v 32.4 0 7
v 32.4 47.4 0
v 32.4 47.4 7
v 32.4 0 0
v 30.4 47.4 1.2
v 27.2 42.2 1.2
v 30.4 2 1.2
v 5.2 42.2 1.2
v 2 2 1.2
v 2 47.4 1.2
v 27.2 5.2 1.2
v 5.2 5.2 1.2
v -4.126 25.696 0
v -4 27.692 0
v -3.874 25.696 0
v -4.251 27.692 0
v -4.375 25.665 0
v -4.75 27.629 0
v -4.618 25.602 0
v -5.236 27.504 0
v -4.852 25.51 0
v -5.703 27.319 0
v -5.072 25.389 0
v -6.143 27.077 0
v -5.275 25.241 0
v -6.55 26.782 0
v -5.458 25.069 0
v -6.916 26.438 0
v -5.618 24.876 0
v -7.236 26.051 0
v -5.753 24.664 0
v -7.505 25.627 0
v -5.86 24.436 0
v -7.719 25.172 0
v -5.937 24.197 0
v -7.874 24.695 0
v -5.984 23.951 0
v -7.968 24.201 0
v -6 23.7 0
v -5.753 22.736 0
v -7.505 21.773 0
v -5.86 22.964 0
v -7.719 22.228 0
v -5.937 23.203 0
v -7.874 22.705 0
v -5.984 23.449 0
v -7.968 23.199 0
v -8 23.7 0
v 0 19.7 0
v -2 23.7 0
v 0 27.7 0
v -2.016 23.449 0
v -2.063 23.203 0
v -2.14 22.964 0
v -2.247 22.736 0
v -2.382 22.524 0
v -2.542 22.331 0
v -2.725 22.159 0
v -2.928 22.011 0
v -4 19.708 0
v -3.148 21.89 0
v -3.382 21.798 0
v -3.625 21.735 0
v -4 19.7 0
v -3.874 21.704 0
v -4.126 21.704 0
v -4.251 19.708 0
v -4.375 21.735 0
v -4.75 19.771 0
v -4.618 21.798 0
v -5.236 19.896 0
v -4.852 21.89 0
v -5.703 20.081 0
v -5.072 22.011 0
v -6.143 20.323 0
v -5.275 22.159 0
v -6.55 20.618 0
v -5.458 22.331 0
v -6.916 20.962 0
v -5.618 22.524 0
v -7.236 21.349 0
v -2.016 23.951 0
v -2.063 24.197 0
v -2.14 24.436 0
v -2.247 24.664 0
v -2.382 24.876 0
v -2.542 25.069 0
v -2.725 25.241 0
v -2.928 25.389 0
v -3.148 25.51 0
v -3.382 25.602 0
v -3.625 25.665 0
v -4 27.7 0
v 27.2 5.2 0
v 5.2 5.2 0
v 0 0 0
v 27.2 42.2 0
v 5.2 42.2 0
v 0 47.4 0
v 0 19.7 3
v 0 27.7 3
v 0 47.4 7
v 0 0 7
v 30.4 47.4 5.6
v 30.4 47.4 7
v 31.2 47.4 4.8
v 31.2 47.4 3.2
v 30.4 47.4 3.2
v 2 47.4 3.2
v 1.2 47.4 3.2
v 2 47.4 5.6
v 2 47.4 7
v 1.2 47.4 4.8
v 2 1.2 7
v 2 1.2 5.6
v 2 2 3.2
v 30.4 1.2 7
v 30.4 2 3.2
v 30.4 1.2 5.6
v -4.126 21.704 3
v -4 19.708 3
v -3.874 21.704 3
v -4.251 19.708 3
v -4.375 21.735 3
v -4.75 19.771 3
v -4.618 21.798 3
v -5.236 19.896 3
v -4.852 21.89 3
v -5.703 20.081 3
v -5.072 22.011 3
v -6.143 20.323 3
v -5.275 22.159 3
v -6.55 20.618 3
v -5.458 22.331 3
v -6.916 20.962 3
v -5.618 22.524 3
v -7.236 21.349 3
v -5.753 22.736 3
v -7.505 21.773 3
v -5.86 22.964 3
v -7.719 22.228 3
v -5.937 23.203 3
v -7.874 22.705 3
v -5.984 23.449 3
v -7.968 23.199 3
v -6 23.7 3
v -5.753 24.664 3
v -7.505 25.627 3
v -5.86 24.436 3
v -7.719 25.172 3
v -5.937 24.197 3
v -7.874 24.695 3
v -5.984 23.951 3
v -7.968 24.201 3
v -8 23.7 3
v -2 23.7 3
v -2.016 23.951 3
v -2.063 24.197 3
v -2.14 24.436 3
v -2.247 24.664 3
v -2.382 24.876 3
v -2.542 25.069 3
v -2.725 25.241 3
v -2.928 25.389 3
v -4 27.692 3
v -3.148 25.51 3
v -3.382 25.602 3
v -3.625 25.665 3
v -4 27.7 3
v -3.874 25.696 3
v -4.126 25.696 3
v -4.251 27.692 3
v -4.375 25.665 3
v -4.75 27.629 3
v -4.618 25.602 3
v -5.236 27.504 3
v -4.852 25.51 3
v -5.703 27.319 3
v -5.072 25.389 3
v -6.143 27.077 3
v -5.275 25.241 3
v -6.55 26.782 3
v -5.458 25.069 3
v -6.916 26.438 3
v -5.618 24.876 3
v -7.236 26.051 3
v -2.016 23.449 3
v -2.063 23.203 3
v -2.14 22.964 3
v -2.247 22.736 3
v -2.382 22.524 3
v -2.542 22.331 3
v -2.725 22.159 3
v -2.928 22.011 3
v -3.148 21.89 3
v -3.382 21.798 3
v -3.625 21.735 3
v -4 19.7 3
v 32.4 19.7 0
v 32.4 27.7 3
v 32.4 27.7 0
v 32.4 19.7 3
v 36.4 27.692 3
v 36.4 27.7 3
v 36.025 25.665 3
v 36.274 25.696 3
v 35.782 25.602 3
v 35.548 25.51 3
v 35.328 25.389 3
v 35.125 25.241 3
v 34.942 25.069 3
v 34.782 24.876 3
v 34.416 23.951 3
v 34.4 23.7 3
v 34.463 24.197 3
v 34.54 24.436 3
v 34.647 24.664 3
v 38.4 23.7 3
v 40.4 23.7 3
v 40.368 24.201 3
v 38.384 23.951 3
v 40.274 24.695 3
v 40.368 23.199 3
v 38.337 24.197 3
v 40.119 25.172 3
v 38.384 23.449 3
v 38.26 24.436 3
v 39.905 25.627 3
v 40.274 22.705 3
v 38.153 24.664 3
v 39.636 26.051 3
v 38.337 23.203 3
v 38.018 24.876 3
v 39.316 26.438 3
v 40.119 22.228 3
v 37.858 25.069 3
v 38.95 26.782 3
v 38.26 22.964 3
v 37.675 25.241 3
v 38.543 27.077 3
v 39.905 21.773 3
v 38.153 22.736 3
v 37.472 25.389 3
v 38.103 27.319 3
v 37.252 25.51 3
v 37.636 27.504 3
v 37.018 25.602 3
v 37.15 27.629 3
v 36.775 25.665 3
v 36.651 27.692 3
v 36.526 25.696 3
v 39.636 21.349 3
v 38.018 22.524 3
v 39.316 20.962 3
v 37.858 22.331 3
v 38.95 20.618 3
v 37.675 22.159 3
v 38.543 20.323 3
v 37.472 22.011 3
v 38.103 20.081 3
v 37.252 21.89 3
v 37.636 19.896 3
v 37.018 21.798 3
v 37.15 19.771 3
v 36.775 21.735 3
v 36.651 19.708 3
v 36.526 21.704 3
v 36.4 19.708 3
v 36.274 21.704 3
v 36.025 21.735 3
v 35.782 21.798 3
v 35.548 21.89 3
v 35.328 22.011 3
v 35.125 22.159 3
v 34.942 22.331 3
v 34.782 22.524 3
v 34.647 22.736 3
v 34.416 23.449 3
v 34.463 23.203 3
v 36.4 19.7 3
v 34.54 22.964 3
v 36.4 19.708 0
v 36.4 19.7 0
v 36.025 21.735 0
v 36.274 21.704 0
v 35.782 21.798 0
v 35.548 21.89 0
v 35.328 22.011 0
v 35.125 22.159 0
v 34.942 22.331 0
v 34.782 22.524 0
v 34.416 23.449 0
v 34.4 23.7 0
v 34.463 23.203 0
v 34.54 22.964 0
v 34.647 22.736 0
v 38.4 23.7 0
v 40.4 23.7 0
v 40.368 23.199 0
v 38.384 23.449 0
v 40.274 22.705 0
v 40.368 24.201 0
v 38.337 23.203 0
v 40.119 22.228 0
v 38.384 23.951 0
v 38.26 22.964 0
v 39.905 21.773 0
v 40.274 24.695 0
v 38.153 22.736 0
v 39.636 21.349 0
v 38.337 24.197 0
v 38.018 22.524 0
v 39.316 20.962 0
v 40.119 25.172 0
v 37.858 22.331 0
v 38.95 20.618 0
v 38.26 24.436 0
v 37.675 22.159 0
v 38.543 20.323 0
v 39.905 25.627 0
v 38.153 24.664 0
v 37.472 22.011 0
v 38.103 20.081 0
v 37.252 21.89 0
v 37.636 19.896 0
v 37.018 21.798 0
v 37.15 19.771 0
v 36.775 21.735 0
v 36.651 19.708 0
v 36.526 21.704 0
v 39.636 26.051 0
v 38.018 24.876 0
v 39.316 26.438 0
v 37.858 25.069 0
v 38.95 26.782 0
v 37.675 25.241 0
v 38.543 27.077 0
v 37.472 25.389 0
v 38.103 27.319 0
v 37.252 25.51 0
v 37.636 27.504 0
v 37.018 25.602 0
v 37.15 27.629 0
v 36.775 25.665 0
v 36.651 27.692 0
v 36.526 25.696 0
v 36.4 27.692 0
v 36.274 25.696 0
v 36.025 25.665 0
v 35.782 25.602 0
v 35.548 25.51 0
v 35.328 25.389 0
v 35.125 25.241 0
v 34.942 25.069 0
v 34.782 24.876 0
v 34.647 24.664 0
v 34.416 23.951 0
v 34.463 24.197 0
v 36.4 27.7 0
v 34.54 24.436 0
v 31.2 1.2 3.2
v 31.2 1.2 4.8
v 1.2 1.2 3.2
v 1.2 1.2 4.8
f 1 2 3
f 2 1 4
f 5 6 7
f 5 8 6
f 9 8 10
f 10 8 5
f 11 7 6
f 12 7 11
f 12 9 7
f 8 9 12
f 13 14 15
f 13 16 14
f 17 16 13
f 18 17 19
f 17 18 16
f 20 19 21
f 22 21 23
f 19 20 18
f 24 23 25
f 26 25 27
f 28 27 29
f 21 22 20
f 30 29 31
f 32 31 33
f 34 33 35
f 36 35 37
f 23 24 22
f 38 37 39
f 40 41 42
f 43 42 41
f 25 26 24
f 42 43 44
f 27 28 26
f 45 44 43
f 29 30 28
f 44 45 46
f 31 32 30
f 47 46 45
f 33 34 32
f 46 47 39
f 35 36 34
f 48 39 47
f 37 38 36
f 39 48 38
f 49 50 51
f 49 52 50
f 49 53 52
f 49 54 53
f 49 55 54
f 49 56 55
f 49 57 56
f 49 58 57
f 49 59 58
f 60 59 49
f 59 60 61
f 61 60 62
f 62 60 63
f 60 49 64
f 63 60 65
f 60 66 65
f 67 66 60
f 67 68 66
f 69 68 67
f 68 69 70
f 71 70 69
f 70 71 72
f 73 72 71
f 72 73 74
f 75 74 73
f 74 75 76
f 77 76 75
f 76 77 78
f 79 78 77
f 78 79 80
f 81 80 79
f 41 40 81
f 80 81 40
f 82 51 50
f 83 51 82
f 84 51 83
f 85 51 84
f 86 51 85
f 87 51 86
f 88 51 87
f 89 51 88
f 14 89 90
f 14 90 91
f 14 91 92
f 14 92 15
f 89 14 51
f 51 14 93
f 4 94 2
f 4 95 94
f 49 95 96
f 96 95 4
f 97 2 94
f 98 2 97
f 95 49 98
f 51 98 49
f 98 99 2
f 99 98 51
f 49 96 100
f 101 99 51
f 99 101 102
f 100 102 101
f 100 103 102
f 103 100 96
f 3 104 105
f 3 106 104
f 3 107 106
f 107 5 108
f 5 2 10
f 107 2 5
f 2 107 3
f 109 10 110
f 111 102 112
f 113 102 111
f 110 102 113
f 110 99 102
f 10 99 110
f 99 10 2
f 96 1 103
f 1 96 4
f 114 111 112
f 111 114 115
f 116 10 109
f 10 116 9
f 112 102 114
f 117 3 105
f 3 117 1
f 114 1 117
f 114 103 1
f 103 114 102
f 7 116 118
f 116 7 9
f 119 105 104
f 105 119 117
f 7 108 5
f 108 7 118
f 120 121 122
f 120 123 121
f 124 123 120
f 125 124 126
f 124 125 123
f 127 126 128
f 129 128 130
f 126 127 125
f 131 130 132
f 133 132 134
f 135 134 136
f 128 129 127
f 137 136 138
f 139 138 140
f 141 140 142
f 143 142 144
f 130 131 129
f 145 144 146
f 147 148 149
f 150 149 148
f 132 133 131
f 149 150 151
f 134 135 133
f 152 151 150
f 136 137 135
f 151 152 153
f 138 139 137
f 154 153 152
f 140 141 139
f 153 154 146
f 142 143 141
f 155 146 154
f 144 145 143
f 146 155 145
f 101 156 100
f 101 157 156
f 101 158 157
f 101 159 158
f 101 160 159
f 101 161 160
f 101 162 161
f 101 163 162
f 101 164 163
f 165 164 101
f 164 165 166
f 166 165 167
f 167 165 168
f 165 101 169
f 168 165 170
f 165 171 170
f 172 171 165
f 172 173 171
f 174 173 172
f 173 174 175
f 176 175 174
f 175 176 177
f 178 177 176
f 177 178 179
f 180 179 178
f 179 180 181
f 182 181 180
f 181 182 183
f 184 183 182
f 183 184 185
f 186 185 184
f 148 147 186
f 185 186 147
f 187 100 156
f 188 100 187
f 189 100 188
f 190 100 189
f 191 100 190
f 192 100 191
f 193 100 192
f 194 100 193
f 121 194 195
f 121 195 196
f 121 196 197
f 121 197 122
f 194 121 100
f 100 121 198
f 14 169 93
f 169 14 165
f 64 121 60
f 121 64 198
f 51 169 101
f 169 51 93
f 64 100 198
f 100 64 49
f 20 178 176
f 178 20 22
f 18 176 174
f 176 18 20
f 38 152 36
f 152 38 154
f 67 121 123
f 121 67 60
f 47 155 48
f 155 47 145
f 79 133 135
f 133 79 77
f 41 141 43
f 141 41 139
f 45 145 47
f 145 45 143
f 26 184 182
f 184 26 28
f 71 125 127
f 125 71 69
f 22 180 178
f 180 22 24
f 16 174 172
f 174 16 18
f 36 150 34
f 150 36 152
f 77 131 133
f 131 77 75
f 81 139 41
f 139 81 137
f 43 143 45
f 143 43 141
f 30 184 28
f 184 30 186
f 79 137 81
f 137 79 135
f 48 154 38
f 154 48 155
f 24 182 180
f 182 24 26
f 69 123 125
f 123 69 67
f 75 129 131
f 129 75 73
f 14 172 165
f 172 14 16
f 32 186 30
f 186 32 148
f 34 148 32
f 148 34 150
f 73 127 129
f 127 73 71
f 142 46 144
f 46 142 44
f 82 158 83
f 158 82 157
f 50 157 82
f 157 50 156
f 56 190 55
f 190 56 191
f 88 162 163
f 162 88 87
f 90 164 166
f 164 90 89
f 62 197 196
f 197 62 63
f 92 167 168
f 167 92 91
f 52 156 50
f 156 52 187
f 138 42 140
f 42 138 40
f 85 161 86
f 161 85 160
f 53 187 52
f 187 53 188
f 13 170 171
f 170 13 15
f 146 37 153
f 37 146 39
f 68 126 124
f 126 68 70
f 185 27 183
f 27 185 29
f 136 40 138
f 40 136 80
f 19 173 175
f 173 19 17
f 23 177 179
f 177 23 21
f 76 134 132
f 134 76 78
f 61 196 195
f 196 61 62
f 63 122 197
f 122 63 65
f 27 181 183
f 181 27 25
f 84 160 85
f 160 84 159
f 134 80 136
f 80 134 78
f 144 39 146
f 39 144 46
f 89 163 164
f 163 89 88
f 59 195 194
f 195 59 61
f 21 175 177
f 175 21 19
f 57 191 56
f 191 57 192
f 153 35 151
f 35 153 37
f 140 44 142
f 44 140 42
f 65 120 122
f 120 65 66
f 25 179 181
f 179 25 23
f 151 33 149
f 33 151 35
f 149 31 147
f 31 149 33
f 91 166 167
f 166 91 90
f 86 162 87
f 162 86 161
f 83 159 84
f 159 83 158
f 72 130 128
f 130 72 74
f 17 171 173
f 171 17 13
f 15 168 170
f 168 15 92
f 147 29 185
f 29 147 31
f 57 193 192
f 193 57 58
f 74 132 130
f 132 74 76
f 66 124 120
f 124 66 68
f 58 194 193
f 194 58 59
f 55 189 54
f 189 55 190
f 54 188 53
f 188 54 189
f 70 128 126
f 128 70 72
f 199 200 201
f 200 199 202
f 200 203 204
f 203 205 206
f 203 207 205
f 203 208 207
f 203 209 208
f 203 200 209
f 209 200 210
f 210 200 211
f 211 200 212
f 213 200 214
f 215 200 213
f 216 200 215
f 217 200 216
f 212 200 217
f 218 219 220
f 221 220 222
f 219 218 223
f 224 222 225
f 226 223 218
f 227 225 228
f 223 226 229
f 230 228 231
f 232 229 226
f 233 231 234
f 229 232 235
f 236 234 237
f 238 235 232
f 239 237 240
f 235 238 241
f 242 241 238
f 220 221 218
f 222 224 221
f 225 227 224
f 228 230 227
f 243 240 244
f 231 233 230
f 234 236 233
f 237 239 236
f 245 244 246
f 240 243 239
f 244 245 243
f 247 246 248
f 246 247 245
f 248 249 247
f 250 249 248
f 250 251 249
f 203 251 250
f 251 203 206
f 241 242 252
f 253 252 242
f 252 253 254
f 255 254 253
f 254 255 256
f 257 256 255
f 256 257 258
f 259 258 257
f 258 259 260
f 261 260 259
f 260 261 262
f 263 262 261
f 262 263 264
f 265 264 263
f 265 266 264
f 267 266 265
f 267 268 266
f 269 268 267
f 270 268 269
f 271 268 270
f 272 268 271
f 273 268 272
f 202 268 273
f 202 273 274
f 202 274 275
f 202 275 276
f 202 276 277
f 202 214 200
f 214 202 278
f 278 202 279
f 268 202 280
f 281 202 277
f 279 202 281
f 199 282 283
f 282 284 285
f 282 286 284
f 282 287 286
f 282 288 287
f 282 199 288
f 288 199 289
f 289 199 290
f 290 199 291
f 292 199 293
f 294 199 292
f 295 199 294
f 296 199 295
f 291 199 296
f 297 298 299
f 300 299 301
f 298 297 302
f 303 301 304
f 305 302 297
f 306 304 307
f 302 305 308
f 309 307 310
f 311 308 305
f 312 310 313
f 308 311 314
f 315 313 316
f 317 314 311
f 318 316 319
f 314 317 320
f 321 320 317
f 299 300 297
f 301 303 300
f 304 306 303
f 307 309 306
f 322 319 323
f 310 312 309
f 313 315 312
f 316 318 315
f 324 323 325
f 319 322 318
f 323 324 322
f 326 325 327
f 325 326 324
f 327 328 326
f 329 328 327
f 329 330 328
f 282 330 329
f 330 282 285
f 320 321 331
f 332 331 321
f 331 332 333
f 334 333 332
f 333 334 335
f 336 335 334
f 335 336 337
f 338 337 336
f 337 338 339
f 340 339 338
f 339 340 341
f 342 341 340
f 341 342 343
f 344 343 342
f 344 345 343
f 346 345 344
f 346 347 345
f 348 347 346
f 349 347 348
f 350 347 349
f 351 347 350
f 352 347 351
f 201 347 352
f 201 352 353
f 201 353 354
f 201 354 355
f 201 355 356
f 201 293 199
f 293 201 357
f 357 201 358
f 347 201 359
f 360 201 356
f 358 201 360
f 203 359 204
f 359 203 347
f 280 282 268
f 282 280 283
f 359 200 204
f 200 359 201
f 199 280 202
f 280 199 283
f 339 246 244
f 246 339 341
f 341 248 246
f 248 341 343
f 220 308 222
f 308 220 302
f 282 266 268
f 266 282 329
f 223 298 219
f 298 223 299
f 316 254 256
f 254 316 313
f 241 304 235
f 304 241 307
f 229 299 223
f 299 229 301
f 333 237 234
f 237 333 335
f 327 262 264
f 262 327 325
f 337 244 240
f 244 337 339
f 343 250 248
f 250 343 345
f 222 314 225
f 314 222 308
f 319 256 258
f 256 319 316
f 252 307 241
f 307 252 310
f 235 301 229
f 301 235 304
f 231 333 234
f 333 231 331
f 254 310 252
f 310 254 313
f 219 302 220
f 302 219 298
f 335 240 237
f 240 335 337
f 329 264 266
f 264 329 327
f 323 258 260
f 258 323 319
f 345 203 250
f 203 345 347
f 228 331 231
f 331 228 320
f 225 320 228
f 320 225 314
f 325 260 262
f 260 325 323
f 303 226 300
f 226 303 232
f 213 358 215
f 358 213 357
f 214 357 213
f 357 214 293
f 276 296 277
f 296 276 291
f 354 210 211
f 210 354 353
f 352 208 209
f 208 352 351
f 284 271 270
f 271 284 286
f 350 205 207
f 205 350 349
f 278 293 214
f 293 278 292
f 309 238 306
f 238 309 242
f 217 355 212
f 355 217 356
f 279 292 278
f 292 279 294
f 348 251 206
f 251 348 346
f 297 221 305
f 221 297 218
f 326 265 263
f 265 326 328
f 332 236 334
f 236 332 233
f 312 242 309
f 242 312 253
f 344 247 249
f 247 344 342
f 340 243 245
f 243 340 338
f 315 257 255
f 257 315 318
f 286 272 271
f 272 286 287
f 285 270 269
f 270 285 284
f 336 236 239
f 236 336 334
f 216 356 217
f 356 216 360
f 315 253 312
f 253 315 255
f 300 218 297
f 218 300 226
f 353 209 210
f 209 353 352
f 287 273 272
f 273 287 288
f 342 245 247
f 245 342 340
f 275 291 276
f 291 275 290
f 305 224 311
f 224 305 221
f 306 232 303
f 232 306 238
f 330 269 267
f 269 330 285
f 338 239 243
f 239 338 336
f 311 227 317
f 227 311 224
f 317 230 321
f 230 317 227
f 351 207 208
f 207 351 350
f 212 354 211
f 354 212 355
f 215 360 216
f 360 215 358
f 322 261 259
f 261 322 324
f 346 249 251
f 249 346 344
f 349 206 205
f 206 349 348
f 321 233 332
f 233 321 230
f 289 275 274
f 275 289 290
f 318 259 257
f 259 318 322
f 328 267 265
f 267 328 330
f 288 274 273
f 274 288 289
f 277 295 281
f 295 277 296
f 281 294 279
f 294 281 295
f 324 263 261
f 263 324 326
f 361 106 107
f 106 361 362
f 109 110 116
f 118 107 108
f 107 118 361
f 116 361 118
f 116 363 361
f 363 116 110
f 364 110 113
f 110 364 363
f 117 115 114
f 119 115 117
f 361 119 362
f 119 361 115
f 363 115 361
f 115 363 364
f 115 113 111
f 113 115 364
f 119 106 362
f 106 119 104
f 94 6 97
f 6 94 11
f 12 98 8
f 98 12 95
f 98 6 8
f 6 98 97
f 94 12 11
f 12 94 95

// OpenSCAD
// file: ../lib/pcb_led_cvf.scad
// for led power module modified

/* bluetooth_mate_holder.scad
 * By John Biehler - November 17, 2011
 * http://www.thingiverse.com/thing:

 * derived from pcb_box_slide_with_tabs.scad
 * By Nicholas C Lewis - Jan 1, 2011
 * http://www.thingiverse.com/thing:5396
 *
 * derived from pcb_box_slide.scad
 *     Parametric, open PCB-box (slide-in) by chlunde
 *     http://www.thingiverse.com/thing:4071
 *
 * CHANGES
 * - adjusted to fit Arduino Mega
 * - added mounting tabs
 * - turned off cutouts
 * - adjusted bottom cutout size
 */

$fn=50;

module pcb_led_cvf(

	pcb_width = 48.2,
	pcb_length =24.1,
	pcb_height =1.1,
	slisse = 0.8,

	pcb_bottom_margin = 1,
	wall_width_thick = 2,
	box_height = 7,

	//tab parameters
	tab_hole_radius=2,
	tab_outer_radius=4,

	inner_margin = 4,

	add_tabs = true

) {
	wall_width = wall_width_thick-slisse;

module tab() {
	difference(){
		union() {
			translate([-tab_outer_radius,-tab_outer_radius,0])
			cube([tab_outer_radius,2*tab_outer_radius,wall_width_thick+1]);
			translate([-tab_outer_radius,0,0])
				cylinder(r=tab_outer_radius, h = wall_width_thick+1);
		}
		translate([-tab_outer_radius,0,0]) {
			cylinder(r= tab_hole_radius, h = wall_width_thick+5,center=true);
		}
	}

}

module box() {
	union() {
		cube([pcb_width + 2*wall_width, pcb_length + 2*wall_width, wall_width]);

		cube([wall_width_thick, pcb_length + 2*wall_width, box_height]);

		cube([pcb_width + 2*wall_width, wall_width_thick, box_height]);

		%translate([0, pcb_length+wall_width, 0])
			cube([pcb_width + 2*wall_width,wall_width,box_height]);

		translate([pcb_width + wall_width - slisse,0,0])
			cube([wall_width_thick, pcb_length + 2*wall_width, box_height]);
	}
	if(add_tabs) {
//comment out this part to remove tabs
		for(i=[(pcb_length + 2*wall_width)/2]){
	translate([0,i,0])tab();
	translate([pcb_width + 2*wall_width,i,0])mirror()tab();
		}
	}

}

module pcb() {
	translate([wall_width, wall_width, wall_width + pcb_bottom_margin])
		cube([pcb_width,pcb_length + wall_width + 0.1,pcb_height]);
	translate([wall_width, wall_width, wall_width + pcb_bottom_margin+pcb_height])rotate([0,45,0])
		cube([pcb_height,pcb_length + wall_width + 0.1,pcb_height]);
	translate([wall_width+pcb_width-2*cos(45)*pcb_height, wall_width, wall_width + pcb_bottom_margin+pcb_height])rotate([0,45,0])
		cube([pcb_height,pcb_length + wall_width + 0.1,pcb_height]);
	translate([wall_width_thick, wall_width, wall_width + pcb_bottom_margin])
		cube([pcb_width-2*slisse,pcb_length + wall_width + 0.1,box_height]);

}



module holes() {
		*translate([wall_width + pcb_width/2, wall_width_thick + 0.1, pcb_width/2+wall_width])
			rotate(a=90,v=[1,0,0])
				cylinder(r=pcb_width/2, h=wall_width_thick + 0.2);

		*translate([-0.1, wall_width + pcb_length/2, pcb_length/2 + wall_width])
			rotate(a=90,v=[0,1,0])
				cylinder(r=pcb_length/2, h=wall_width_thick + 0.2);

		*translate([pcb_width + wall_width - slisse - 0.1, wall_width + pcb_length/2, pcb_length/2 + wall_width])
			rotate(a=90,v=[0,1,0])
				cylinder(r=pcb_length/2, h=wall_width_thick + 0.2);

	 * translate([pcb_width/2 + wall_width, wall_width + pcb_length/2, -0.1])
			rotate(a=0,v=[0,1,0])
				cylinder(r=min(pcb_length,pcb_width)/2 - wall_width/2, h=wall_width_thick + 0.2);

		translate([inner_margin +wall_width, inner_margin+wall_width, -0.1])
			cube([pcb_width-inner_margin*2,pcb_length -inner_margin*2,wall_width + 0.2]);
}

	difference() {
		box();
		pcb();
		holes();
	}
}



pcb_led_cvf();
// main file
use <../lib/pcb_led_cvf.scad>

$fn = 50;

pcb_led_cvf(
  pcb_length=45,
  pcb_width=30,
  pcb_height=1.6,
  pcb_bottom_margin=2
);
